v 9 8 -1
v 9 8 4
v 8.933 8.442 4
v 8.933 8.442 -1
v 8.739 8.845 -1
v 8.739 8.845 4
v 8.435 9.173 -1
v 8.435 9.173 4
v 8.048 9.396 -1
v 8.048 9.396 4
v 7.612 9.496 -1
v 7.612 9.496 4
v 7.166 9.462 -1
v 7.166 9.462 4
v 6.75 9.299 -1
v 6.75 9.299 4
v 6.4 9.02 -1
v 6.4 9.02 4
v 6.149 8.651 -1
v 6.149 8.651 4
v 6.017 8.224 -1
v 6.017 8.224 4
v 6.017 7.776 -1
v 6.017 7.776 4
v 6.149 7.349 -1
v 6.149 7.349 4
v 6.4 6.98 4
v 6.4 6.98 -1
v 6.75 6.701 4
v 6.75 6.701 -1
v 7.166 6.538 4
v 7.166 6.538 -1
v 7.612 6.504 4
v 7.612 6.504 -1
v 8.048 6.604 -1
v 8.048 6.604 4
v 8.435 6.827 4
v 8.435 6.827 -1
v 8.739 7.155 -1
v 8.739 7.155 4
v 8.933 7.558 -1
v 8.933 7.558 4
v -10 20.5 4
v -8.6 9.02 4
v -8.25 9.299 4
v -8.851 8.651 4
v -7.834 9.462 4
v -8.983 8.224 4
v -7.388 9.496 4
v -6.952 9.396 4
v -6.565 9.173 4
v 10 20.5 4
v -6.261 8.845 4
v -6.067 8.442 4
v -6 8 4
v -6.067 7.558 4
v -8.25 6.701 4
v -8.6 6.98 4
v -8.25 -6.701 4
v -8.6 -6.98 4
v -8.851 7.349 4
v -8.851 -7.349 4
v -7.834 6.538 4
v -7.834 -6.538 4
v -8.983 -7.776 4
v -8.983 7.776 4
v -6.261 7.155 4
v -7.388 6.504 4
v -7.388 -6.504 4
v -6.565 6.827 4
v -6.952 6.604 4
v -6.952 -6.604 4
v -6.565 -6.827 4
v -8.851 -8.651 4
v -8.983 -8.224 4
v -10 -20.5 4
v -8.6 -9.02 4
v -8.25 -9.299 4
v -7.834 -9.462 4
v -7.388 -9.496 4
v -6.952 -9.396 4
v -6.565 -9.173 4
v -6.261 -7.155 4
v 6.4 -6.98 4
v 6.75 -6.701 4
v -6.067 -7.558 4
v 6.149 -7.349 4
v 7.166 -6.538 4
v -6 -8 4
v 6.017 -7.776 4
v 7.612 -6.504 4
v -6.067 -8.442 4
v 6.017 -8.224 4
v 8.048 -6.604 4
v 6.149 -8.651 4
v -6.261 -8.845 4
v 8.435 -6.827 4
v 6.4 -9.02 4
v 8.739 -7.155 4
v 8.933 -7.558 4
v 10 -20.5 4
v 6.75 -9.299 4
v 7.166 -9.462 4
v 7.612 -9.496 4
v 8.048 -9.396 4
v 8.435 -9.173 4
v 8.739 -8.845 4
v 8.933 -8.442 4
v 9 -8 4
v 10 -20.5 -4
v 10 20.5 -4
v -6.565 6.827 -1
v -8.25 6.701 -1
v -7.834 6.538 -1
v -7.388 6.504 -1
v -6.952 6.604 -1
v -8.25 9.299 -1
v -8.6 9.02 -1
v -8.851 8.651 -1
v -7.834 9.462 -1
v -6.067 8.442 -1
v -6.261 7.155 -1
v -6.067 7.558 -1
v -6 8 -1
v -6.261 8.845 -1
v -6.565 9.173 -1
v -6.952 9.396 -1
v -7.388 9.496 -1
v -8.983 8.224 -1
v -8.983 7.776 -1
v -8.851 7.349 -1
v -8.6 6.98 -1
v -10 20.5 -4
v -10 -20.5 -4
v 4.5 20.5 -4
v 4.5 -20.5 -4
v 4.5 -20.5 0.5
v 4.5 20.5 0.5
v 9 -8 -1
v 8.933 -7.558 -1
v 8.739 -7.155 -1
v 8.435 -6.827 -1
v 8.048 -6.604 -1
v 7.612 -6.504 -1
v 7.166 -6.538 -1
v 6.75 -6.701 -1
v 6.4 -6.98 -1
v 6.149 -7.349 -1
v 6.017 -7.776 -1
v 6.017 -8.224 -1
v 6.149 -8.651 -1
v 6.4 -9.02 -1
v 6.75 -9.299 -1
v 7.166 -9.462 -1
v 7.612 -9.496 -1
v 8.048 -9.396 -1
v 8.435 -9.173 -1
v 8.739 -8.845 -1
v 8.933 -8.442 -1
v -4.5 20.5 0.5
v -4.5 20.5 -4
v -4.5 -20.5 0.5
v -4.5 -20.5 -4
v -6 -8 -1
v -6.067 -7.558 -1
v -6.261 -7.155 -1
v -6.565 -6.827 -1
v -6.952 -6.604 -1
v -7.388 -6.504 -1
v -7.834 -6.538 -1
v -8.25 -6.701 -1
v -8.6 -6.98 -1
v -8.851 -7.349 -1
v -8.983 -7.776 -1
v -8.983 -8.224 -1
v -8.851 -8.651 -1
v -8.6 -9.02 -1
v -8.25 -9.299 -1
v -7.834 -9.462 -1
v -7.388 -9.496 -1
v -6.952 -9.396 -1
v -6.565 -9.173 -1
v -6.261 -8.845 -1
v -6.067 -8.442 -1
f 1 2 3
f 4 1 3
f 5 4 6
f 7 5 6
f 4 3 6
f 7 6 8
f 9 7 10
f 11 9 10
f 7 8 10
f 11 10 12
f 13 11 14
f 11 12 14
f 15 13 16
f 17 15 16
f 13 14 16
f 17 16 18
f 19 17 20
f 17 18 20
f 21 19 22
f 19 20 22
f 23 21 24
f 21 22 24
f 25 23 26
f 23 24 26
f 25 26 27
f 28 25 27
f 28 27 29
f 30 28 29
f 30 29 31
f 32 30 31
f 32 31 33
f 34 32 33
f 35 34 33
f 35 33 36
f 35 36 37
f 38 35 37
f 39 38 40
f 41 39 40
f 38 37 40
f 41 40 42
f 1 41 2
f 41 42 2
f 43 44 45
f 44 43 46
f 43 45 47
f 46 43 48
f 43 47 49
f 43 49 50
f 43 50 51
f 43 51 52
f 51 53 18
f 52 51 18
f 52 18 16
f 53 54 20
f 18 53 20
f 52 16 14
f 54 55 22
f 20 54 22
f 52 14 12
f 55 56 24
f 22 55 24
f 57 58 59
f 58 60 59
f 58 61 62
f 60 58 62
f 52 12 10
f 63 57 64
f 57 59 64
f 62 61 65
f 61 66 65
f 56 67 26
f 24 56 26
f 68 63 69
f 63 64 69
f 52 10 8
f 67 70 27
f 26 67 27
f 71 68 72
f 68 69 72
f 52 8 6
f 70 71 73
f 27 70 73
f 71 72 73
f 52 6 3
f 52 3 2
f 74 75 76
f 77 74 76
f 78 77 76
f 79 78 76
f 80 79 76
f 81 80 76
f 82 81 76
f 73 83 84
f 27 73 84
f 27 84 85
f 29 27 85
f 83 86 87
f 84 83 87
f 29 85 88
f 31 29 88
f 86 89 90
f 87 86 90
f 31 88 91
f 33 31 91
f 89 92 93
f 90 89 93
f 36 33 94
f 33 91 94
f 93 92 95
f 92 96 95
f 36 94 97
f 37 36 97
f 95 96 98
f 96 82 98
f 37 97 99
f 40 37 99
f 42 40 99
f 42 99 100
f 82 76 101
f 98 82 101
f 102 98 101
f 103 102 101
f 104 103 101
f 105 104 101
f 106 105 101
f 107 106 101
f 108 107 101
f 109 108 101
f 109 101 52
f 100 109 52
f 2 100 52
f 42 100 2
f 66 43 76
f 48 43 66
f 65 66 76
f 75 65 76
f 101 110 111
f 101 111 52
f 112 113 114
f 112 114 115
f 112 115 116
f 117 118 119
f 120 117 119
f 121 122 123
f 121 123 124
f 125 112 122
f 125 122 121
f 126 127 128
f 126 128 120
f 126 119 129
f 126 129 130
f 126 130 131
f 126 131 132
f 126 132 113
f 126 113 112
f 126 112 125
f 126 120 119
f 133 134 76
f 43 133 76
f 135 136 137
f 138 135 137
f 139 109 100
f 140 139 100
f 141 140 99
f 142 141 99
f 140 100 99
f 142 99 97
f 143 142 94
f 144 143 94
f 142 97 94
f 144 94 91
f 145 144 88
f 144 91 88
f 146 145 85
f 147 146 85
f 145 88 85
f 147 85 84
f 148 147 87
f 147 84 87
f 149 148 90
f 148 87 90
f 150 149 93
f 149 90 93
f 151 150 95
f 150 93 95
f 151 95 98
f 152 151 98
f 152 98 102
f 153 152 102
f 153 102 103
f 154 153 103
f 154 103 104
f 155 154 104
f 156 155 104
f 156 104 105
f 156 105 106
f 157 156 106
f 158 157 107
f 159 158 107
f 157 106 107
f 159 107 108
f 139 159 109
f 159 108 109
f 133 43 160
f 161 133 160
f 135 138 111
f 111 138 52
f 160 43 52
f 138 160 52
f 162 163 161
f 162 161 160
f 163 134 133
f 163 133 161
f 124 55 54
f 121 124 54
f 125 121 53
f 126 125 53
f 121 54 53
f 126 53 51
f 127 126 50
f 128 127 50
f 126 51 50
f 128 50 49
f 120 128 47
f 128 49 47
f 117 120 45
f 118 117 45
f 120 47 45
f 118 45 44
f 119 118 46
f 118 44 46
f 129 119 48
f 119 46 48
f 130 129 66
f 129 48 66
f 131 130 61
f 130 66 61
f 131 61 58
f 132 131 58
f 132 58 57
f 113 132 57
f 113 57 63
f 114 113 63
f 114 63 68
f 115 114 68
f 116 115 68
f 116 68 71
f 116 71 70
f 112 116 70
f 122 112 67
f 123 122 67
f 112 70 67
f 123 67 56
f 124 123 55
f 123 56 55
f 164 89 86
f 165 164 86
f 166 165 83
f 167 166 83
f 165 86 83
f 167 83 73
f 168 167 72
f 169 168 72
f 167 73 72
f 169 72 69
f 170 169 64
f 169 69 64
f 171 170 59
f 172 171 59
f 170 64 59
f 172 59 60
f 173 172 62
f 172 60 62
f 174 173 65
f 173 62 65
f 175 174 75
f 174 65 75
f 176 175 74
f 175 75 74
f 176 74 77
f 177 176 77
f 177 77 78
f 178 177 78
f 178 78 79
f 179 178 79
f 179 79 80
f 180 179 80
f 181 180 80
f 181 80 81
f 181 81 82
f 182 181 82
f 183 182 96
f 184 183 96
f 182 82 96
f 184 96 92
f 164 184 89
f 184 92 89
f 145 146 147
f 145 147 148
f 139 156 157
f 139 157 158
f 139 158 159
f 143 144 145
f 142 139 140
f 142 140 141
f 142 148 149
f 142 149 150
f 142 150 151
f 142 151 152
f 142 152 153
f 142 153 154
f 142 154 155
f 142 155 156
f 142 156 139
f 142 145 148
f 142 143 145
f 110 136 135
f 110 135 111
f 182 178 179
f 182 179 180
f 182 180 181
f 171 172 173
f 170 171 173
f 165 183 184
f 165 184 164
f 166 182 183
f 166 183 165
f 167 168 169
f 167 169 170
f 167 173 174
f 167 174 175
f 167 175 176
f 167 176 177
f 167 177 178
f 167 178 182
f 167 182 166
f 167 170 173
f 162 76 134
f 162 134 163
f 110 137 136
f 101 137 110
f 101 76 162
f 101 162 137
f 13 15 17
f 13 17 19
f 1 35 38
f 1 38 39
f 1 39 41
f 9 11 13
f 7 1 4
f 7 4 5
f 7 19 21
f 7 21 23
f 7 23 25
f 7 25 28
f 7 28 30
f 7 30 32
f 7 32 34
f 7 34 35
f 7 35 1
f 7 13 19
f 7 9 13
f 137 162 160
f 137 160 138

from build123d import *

# Parameters (mm, degrees)
F0_W     = 20
F0_H     = 8
F1_DEPTH = 20.5
F2_W     = 9
F2_H     = 4.5
F3_DEPTH = 41.001
F4_R     = 1.5
F5_DEPTH = 5


with BuildPart() as f1:
    # F0 (on Front) → F1 (new body, symmetric)
    with BuildSketch(Plane.XZ):
        Rectangle(F0_W, F0_H)
    extrude(amount=F1_DEPTH, both=True)

    # F2 (on face) → F3 (cut, through all)
    with BuildSketch(Plane.XZ.offset(20.5)):
        with Locations((0, -1.75)):
            Rectangle(F2_W, F2_H)
    extrude(amount=-F3_DEPTH, mode=Mode.SUBTRACT)

    # F4 (on face) → F5 (cut)
    with BuildSketch(Plane.XY.offset(4)):
        with Locations((-7.5, 8)):
            Circle(F4_R)
        with Locations((7.5, 8)):
            Circle(F4_R)
        with Locations((7.5, -8)):
            Circle(F4_R)
        with Locations((-7.5, -8)):
            Circle(F4_R)
    extrude(amount=-F5_DEPTH, mode=Mode.SUBTRACT)


solid = f1.part
